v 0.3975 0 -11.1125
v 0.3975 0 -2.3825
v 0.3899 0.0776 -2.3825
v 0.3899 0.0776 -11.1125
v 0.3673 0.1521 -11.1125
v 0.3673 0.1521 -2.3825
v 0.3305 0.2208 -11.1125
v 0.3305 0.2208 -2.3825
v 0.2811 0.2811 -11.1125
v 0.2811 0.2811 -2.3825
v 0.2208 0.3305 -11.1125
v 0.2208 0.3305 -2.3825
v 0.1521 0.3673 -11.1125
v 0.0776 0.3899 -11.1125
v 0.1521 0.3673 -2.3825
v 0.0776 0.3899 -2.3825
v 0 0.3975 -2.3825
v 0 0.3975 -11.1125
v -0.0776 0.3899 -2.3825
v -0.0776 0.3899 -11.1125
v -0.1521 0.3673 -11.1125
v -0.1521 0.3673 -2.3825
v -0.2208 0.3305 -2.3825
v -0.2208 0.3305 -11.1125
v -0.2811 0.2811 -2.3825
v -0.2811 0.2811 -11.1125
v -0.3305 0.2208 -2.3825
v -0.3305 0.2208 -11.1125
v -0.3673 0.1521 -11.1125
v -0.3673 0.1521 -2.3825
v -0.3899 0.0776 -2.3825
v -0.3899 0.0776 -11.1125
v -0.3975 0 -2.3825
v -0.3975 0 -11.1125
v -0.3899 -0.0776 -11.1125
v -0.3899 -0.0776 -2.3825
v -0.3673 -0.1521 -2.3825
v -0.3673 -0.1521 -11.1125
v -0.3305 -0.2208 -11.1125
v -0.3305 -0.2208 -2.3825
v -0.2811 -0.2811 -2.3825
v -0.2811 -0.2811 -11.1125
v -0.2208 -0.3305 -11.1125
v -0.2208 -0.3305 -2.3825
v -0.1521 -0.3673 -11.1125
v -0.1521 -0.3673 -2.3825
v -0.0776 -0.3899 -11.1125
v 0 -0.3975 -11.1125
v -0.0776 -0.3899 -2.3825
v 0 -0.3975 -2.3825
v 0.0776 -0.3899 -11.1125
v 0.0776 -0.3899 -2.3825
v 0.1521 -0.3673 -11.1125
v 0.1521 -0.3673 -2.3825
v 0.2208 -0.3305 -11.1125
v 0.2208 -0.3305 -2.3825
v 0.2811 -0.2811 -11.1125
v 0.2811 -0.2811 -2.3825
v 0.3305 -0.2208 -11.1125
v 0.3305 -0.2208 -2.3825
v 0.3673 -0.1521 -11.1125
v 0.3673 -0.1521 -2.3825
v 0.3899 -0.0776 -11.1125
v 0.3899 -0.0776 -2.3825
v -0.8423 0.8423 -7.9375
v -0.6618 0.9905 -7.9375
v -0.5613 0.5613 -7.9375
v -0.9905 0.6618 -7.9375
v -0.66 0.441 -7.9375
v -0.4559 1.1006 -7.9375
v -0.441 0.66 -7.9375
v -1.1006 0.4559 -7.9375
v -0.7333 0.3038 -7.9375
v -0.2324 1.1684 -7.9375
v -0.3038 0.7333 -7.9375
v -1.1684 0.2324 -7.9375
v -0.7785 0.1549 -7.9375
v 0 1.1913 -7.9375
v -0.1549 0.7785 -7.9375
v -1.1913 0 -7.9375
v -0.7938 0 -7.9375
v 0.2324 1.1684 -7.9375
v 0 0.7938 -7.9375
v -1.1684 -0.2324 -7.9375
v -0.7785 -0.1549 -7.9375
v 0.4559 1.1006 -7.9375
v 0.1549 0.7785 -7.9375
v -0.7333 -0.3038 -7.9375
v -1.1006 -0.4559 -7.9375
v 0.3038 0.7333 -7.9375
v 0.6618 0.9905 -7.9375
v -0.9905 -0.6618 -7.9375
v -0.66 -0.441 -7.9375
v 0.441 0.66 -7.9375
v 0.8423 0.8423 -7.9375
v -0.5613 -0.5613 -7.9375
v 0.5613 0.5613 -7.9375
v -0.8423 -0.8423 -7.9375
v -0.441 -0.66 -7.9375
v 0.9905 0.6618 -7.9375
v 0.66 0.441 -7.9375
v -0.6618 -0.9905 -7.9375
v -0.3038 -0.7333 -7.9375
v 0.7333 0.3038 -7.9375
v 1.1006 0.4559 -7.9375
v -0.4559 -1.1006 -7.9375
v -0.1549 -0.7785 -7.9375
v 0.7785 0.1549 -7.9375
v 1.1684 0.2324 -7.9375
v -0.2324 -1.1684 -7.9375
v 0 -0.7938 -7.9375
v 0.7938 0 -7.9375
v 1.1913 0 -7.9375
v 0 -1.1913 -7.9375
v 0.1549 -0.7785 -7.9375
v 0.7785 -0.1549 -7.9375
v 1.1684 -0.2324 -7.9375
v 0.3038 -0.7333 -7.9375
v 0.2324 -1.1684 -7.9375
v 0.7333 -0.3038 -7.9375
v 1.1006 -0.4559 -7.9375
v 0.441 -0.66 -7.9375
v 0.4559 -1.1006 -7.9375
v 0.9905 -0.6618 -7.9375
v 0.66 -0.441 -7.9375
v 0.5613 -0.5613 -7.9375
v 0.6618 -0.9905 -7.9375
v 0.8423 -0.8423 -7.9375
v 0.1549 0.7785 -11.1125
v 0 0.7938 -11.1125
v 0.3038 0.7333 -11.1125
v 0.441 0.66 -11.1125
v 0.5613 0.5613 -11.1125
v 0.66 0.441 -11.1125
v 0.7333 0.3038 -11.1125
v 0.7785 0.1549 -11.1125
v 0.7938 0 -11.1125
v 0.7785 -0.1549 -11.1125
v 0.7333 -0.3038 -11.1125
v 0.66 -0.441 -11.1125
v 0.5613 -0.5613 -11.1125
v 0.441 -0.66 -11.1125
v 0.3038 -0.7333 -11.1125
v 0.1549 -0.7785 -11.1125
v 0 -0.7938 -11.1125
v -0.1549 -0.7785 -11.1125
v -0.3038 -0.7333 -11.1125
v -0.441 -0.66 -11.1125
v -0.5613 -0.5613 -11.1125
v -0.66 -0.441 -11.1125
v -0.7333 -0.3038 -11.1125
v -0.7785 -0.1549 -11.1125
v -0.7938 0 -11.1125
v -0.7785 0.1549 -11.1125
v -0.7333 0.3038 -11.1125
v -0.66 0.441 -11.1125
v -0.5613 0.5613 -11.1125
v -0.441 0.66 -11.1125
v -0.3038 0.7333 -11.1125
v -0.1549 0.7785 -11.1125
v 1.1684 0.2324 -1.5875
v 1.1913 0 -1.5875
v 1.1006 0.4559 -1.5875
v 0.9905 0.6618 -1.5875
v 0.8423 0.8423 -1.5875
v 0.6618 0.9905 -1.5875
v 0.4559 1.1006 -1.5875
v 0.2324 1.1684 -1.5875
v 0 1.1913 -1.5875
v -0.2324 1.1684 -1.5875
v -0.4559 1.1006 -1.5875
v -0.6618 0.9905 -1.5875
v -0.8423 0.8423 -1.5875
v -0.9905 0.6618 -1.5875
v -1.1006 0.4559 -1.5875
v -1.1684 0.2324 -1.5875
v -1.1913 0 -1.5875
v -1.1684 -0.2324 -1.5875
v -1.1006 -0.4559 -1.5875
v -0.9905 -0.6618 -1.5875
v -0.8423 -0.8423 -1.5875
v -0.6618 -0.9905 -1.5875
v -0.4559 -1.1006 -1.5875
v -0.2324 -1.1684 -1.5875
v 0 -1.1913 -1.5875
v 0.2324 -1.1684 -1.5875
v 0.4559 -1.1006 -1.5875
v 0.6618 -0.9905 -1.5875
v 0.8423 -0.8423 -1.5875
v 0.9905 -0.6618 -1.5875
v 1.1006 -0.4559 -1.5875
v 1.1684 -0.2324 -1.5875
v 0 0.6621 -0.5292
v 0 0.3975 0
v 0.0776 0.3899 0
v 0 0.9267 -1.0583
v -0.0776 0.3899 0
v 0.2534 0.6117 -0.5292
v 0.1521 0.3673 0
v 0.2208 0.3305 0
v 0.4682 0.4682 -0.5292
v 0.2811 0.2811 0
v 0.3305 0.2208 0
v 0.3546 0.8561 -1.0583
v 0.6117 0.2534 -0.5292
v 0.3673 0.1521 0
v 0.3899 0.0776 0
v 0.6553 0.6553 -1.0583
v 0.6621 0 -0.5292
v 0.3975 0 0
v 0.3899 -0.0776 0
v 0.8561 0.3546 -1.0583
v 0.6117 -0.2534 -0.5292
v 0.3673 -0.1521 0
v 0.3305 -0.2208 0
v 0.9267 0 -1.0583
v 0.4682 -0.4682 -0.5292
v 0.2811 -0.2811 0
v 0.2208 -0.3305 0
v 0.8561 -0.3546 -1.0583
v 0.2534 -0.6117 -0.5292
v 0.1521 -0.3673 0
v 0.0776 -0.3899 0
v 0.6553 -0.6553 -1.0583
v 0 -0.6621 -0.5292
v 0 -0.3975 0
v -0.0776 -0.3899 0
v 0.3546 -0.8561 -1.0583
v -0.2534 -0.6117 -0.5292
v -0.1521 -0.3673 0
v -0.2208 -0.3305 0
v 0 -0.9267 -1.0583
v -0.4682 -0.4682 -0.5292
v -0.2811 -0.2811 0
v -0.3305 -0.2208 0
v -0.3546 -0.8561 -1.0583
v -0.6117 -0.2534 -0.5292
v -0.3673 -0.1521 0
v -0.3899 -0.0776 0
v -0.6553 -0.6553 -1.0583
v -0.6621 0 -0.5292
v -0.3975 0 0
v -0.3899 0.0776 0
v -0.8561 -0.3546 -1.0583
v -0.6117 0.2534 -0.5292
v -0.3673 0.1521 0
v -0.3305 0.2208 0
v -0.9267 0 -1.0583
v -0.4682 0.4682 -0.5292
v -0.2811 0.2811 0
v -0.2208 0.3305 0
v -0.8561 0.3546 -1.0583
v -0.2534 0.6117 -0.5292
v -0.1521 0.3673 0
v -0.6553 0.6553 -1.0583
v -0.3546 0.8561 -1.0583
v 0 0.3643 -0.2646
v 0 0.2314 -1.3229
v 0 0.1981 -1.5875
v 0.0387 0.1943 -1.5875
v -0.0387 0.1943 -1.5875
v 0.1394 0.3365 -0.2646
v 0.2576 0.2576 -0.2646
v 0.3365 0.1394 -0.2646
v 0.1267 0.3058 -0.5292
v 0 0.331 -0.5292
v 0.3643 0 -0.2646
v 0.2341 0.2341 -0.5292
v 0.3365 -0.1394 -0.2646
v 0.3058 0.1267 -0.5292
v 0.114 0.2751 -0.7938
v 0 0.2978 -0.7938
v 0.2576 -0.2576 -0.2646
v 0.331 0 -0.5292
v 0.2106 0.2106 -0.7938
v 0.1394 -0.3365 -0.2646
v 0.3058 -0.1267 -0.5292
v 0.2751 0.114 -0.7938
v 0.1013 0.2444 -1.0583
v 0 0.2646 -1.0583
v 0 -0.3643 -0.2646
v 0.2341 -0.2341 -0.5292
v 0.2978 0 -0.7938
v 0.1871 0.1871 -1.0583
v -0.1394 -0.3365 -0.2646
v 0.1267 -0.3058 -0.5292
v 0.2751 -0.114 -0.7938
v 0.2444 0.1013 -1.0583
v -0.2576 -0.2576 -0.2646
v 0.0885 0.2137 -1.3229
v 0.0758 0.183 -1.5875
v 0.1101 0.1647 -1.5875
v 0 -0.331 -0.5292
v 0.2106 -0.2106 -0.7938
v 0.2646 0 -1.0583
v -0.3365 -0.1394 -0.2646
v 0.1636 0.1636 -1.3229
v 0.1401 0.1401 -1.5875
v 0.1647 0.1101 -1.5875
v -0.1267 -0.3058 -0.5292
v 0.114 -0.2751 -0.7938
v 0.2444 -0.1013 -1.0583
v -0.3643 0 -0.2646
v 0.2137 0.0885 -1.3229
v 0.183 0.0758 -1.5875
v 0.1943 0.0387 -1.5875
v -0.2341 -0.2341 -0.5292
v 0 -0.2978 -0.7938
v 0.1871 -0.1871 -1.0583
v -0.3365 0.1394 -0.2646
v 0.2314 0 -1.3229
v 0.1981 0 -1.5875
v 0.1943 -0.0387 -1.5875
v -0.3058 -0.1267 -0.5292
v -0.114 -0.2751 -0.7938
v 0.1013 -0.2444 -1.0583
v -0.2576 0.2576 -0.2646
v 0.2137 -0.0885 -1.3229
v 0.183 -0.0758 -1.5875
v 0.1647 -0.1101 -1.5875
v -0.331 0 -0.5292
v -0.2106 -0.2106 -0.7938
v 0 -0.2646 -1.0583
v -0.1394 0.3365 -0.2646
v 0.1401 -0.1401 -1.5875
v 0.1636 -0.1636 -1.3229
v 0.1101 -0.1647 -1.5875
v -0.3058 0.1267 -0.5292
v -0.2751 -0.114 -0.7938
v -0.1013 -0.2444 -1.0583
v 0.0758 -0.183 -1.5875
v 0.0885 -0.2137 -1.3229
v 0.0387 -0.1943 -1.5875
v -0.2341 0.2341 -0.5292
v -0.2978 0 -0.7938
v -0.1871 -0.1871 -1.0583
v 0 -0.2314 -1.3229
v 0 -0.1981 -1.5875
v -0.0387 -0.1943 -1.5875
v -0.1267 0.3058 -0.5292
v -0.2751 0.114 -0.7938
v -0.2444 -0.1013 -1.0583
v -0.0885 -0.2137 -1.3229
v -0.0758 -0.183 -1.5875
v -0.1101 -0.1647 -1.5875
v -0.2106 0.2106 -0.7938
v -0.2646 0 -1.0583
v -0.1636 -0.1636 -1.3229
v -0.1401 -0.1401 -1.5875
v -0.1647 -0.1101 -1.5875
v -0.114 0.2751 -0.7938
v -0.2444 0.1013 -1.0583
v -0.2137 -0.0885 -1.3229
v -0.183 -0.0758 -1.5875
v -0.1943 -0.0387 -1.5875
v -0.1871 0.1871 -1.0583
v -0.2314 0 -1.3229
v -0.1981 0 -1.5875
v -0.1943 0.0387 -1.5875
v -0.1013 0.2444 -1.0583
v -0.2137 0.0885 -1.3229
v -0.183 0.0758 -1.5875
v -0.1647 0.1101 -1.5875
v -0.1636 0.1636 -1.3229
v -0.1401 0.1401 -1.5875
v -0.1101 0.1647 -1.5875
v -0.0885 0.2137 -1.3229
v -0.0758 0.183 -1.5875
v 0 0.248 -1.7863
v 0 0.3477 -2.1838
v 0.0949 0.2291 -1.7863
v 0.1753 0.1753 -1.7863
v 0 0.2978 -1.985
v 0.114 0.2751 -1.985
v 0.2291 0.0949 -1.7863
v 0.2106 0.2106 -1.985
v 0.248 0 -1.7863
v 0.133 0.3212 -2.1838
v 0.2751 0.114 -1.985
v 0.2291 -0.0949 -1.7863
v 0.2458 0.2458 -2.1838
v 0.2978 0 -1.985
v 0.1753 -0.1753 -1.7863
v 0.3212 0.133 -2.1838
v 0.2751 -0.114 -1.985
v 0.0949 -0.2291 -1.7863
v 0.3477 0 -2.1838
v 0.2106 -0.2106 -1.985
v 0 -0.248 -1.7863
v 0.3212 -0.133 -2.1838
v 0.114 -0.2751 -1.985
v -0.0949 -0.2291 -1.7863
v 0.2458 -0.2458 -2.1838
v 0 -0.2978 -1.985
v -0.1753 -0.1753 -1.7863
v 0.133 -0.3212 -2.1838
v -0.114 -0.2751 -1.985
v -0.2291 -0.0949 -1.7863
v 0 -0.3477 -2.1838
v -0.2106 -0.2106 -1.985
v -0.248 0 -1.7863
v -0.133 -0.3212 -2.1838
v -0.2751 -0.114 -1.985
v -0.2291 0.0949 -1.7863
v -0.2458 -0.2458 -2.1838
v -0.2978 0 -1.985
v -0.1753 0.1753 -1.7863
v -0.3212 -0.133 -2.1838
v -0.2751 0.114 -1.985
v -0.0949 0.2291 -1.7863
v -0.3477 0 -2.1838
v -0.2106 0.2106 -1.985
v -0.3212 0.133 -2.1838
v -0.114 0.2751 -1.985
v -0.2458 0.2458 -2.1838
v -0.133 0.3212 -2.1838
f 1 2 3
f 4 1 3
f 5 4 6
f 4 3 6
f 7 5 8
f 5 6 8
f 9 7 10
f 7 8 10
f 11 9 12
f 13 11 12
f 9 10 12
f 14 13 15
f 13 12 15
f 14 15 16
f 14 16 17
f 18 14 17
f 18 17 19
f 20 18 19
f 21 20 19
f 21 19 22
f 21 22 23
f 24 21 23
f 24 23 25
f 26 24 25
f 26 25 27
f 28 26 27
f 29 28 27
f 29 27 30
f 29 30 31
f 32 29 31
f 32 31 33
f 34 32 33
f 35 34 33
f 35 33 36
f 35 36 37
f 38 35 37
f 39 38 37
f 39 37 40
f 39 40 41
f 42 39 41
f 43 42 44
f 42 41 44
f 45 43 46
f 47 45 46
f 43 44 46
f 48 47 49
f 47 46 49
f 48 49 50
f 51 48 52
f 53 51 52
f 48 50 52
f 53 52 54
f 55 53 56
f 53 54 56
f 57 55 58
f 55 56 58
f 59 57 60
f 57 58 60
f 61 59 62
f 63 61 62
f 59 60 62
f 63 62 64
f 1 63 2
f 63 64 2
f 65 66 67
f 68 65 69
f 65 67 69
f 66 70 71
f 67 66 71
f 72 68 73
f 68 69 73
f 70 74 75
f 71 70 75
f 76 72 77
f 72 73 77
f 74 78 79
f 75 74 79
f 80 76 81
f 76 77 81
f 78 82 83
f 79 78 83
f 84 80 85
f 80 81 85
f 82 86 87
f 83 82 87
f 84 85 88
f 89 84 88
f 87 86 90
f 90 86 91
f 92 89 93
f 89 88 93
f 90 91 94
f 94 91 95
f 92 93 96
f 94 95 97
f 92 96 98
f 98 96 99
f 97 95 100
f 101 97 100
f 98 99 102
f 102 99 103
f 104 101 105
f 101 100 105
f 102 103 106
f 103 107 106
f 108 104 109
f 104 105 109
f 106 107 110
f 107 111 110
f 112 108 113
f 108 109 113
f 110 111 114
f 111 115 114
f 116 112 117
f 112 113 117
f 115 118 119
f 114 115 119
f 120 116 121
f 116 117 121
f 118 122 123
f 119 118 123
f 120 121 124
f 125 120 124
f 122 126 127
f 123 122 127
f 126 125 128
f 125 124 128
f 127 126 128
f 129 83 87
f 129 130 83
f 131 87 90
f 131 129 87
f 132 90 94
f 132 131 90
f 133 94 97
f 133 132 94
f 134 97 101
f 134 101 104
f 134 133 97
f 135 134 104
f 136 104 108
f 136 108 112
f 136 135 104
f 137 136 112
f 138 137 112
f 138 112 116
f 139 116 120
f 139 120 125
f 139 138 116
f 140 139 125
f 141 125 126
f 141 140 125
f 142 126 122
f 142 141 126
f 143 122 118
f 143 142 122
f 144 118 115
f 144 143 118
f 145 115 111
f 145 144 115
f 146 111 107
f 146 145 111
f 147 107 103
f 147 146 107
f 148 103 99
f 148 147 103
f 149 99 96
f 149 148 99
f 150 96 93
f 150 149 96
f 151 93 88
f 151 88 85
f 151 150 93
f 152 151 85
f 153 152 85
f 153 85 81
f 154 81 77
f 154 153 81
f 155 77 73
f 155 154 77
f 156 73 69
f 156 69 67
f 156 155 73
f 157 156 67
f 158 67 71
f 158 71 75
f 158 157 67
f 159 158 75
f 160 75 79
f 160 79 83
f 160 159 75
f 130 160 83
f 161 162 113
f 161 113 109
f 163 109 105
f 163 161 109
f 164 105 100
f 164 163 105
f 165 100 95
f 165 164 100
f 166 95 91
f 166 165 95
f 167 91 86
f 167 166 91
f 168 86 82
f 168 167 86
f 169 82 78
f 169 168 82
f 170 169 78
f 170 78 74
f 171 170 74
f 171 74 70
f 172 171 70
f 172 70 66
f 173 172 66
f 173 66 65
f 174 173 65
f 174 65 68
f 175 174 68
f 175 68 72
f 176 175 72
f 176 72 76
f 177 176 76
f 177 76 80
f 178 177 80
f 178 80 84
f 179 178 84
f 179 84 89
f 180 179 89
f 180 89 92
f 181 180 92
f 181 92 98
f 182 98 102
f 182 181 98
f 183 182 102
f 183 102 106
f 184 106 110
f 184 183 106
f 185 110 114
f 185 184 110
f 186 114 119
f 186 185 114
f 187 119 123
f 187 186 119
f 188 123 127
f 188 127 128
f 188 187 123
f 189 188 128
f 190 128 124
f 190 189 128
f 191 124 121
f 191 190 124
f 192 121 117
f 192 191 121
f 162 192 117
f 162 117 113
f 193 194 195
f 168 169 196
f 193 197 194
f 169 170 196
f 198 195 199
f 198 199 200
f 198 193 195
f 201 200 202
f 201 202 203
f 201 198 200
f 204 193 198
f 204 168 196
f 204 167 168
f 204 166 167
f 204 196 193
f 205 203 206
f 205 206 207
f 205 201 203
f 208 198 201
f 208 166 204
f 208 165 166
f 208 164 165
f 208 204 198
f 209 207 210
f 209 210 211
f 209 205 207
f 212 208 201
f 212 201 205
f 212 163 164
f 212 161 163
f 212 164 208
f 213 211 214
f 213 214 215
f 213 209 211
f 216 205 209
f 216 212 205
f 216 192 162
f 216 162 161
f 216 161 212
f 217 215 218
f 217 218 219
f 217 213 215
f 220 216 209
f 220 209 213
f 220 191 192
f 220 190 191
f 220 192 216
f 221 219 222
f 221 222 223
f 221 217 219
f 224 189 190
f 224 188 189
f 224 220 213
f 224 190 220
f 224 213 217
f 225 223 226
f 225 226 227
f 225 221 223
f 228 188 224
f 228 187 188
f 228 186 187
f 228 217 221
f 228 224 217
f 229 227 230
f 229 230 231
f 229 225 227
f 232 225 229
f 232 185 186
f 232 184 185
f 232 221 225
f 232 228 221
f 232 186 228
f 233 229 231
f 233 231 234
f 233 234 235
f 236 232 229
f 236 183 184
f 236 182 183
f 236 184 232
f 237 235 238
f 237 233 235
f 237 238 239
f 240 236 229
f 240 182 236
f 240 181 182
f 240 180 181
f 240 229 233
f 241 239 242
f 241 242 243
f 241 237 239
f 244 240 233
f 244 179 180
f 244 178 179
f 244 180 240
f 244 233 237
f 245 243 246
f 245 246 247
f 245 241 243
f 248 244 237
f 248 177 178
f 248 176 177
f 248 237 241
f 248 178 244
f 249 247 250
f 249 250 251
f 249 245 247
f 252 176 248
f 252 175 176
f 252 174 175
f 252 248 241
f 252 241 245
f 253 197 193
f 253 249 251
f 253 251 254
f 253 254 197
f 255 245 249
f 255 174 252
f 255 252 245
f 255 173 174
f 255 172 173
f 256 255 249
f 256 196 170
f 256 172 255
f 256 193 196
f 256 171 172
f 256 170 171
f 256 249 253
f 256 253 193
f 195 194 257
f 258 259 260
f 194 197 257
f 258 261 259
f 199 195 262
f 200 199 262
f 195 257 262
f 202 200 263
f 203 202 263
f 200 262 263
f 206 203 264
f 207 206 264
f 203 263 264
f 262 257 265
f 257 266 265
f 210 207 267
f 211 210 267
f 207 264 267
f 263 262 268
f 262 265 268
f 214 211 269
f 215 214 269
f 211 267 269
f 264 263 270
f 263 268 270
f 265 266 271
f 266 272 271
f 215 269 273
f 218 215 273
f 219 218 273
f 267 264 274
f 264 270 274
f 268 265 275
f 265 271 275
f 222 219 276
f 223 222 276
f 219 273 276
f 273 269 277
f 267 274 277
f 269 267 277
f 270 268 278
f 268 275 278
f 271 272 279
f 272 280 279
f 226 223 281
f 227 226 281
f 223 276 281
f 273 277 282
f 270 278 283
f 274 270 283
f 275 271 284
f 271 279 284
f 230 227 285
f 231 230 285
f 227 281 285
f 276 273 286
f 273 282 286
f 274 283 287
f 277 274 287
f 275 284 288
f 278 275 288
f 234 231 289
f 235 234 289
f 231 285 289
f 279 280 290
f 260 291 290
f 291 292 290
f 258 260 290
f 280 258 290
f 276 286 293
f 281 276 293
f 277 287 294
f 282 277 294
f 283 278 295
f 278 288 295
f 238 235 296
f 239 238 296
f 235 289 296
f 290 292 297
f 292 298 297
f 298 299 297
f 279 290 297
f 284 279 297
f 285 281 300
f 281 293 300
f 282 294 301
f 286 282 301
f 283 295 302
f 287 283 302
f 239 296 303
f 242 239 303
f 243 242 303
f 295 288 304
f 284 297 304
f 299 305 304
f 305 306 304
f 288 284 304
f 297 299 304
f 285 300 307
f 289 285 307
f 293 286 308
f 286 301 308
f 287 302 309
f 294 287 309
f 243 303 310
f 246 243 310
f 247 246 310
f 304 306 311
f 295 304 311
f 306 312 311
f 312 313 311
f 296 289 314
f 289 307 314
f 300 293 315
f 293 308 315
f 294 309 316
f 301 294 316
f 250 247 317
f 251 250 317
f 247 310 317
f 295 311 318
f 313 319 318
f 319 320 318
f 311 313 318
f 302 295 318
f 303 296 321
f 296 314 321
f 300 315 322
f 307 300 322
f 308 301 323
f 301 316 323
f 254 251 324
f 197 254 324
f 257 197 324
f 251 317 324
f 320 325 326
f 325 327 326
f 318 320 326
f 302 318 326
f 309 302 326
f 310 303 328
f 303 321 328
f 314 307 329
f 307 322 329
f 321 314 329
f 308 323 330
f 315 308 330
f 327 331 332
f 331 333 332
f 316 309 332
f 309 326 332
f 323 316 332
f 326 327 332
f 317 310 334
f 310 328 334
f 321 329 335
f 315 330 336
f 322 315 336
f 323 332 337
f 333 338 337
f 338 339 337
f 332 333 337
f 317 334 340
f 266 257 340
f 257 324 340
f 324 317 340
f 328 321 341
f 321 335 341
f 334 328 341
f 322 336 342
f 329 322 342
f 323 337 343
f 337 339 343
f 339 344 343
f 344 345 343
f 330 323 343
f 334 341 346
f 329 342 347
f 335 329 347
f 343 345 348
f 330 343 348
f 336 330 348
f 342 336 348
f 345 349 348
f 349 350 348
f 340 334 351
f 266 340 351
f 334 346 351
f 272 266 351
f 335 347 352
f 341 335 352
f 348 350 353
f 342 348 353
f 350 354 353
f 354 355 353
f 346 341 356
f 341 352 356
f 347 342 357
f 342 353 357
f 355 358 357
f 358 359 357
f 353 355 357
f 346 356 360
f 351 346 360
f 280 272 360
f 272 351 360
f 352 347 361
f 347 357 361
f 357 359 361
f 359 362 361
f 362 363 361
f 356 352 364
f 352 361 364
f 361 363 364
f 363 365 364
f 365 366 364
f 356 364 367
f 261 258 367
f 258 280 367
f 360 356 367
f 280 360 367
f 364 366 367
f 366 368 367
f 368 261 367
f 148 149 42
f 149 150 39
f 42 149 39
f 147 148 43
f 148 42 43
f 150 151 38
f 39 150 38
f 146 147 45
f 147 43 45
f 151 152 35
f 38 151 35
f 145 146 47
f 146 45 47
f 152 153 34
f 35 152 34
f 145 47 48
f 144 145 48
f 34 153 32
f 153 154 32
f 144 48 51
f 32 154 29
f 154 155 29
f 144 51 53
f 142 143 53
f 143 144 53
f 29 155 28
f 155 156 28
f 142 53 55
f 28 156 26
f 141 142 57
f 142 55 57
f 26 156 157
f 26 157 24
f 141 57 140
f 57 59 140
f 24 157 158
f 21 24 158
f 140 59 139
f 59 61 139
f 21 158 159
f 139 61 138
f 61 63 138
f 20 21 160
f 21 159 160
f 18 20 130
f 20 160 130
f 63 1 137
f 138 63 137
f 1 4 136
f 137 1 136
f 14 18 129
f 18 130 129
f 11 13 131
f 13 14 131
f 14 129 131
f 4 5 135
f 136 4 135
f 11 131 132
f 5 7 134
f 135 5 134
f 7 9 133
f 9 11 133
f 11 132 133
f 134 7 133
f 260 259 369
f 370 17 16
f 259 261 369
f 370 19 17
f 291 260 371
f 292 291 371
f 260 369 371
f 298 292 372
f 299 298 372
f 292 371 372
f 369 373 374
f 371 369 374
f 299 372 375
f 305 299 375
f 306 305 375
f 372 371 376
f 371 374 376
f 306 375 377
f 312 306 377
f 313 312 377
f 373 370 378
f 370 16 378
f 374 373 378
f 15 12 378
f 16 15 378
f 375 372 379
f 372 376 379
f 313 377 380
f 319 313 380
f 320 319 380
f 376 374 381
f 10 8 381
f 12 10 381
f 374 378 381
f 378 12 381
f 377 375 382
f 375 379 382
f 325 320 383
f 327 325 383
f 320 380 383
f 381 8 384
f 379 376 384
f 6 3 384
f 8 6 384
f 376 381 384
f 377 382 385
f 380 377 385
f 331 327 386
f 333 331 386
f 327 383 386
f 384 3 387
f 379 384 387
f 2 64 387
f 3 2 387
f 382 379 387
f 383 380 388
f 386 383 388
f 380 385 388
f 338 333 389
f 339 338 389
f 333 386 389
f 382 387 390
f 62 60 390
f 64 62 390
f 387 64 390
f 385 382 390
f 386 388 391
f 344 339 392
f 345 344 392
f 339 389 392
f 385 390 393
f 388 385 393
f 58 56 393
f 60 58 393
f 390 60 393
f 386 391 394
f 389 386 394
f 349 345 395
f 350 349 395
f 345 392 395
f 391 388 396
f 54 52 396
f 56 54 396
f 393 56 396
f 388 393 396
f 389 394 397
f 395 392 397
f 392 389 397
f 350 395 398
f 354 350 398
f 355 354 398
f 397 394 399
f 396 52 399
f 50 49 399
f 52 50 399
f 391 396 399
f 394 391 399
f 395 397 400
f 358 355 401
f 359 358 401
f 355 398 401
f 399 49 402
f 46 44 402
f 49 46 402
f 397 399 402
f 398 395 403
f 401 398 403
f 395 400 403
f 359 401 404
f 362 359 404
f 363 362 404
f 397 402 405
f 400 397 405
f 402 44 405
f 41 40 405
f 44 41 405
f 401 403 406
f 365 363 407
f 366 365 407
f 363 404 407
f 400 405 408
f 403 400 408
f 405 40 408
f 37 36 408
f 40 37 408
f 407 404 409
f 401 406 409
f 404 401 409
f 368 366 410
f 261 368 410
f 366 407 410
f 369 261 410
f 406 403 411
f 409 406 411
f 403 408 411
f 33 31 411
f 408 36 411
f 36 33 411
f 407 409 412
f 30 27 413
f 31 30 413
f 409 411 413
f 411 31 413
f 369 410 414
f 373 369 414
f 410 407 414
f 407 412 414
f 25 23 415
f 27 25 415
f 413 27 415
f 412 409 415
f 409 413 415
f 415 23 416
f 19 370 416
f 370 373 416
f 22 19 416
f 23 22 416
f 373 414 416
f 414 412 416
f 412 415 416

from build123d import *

# Parameters (mm, degrees)
SKETCH1_R           = 1.19126
BOSS_EXTRUDE1_DEPTH = 11.1125
SKETCH4_W           = 3.175
SKETCH4_H           = 0.39751
CUT_EXTRUDE1_START  = -2.38252
SKETCH6_R           = 0.39751
CUT_EXTRUDE1_DEPTH  = 11.1125


with BuildPart() as part:
    # Sketch1 → Boss-Extrude1 (new body)
    with BuildSketch(Plane.XY):
        Circle(SKETCH1_R)
    extrude(amount=-BOSS_EXTRUDE1_DEPTH)

    # Sketch2 → Cut-Revolve1 (revolve, cut)
    with BuildSketch(Plane(origin=(0, 0, 0), x_dir=(0, 0, -1), z_dir=(1, 0, 0))):
        Polygon((0, 0.39751), (1.5875, 1.19126), (0, 1.19126), align=None)
    revolve(axis=Axis((0, 0, 0), (0, 0, -1)), mode=Mode.SUBTRACT)

    # Sketch4 → Cut-Revolve2 (revolve, cut)
    with BuildSketch(Plane(origin=(0, 0, 0), x_dir=(0, 0, -1), z_dir=(1, 0, 0))):
        with Locations((9.525, 0.992505)):
            Rectangle(SKETCH4_W, SKETCH4_H)
    revolve(axis=Axis((0, 0, 0), (0, 0, -1)), mode=Mode.SUBTRACT)

    # Sketch5 → Cut-Revolve3 (revolve, cut)
    with BuildSketch(Plane(origin=(0, 0, 0), x_dir=(0, 0, -1), z_dir=(1, 0, 0))):
        Polygon((0, 0.39751), (1.5875, 0.19812), (1.5875, 0), (0, 0), align=None)
    revolve(axis=Axis((0, 0, 0), (0, 0, -1)), mode=Mode.SUBTRACT)

    # Sketch6 → Cut-Extrude1 (cut)
    with BuildSketch(Plane.XY.offset(CUT_EXTRUDE1_START)):
        Circle(SKETCH6_R)
    extrude(amount=-CUT_EXTRUDE1_DEPTH, mode=Mode.SUBTRACT)

    # Sketch7 → Cut-Revolve4 (revolve, cut)
    with BuildSketch(Plane(origin=(0, 0, 0), x_dir=(0, 0, -1), z_dir=(1, 0, 0))):
        Polygon((1.5875, 0.19812), (2.38252, 0.39751), (2.38252, 0), (1.5875, 0), align=None)
    revolve(axis=Axis((0, 0, 0), (0, 0, -1)), mode=Mode.SUBTRACT)


solid = part.part
